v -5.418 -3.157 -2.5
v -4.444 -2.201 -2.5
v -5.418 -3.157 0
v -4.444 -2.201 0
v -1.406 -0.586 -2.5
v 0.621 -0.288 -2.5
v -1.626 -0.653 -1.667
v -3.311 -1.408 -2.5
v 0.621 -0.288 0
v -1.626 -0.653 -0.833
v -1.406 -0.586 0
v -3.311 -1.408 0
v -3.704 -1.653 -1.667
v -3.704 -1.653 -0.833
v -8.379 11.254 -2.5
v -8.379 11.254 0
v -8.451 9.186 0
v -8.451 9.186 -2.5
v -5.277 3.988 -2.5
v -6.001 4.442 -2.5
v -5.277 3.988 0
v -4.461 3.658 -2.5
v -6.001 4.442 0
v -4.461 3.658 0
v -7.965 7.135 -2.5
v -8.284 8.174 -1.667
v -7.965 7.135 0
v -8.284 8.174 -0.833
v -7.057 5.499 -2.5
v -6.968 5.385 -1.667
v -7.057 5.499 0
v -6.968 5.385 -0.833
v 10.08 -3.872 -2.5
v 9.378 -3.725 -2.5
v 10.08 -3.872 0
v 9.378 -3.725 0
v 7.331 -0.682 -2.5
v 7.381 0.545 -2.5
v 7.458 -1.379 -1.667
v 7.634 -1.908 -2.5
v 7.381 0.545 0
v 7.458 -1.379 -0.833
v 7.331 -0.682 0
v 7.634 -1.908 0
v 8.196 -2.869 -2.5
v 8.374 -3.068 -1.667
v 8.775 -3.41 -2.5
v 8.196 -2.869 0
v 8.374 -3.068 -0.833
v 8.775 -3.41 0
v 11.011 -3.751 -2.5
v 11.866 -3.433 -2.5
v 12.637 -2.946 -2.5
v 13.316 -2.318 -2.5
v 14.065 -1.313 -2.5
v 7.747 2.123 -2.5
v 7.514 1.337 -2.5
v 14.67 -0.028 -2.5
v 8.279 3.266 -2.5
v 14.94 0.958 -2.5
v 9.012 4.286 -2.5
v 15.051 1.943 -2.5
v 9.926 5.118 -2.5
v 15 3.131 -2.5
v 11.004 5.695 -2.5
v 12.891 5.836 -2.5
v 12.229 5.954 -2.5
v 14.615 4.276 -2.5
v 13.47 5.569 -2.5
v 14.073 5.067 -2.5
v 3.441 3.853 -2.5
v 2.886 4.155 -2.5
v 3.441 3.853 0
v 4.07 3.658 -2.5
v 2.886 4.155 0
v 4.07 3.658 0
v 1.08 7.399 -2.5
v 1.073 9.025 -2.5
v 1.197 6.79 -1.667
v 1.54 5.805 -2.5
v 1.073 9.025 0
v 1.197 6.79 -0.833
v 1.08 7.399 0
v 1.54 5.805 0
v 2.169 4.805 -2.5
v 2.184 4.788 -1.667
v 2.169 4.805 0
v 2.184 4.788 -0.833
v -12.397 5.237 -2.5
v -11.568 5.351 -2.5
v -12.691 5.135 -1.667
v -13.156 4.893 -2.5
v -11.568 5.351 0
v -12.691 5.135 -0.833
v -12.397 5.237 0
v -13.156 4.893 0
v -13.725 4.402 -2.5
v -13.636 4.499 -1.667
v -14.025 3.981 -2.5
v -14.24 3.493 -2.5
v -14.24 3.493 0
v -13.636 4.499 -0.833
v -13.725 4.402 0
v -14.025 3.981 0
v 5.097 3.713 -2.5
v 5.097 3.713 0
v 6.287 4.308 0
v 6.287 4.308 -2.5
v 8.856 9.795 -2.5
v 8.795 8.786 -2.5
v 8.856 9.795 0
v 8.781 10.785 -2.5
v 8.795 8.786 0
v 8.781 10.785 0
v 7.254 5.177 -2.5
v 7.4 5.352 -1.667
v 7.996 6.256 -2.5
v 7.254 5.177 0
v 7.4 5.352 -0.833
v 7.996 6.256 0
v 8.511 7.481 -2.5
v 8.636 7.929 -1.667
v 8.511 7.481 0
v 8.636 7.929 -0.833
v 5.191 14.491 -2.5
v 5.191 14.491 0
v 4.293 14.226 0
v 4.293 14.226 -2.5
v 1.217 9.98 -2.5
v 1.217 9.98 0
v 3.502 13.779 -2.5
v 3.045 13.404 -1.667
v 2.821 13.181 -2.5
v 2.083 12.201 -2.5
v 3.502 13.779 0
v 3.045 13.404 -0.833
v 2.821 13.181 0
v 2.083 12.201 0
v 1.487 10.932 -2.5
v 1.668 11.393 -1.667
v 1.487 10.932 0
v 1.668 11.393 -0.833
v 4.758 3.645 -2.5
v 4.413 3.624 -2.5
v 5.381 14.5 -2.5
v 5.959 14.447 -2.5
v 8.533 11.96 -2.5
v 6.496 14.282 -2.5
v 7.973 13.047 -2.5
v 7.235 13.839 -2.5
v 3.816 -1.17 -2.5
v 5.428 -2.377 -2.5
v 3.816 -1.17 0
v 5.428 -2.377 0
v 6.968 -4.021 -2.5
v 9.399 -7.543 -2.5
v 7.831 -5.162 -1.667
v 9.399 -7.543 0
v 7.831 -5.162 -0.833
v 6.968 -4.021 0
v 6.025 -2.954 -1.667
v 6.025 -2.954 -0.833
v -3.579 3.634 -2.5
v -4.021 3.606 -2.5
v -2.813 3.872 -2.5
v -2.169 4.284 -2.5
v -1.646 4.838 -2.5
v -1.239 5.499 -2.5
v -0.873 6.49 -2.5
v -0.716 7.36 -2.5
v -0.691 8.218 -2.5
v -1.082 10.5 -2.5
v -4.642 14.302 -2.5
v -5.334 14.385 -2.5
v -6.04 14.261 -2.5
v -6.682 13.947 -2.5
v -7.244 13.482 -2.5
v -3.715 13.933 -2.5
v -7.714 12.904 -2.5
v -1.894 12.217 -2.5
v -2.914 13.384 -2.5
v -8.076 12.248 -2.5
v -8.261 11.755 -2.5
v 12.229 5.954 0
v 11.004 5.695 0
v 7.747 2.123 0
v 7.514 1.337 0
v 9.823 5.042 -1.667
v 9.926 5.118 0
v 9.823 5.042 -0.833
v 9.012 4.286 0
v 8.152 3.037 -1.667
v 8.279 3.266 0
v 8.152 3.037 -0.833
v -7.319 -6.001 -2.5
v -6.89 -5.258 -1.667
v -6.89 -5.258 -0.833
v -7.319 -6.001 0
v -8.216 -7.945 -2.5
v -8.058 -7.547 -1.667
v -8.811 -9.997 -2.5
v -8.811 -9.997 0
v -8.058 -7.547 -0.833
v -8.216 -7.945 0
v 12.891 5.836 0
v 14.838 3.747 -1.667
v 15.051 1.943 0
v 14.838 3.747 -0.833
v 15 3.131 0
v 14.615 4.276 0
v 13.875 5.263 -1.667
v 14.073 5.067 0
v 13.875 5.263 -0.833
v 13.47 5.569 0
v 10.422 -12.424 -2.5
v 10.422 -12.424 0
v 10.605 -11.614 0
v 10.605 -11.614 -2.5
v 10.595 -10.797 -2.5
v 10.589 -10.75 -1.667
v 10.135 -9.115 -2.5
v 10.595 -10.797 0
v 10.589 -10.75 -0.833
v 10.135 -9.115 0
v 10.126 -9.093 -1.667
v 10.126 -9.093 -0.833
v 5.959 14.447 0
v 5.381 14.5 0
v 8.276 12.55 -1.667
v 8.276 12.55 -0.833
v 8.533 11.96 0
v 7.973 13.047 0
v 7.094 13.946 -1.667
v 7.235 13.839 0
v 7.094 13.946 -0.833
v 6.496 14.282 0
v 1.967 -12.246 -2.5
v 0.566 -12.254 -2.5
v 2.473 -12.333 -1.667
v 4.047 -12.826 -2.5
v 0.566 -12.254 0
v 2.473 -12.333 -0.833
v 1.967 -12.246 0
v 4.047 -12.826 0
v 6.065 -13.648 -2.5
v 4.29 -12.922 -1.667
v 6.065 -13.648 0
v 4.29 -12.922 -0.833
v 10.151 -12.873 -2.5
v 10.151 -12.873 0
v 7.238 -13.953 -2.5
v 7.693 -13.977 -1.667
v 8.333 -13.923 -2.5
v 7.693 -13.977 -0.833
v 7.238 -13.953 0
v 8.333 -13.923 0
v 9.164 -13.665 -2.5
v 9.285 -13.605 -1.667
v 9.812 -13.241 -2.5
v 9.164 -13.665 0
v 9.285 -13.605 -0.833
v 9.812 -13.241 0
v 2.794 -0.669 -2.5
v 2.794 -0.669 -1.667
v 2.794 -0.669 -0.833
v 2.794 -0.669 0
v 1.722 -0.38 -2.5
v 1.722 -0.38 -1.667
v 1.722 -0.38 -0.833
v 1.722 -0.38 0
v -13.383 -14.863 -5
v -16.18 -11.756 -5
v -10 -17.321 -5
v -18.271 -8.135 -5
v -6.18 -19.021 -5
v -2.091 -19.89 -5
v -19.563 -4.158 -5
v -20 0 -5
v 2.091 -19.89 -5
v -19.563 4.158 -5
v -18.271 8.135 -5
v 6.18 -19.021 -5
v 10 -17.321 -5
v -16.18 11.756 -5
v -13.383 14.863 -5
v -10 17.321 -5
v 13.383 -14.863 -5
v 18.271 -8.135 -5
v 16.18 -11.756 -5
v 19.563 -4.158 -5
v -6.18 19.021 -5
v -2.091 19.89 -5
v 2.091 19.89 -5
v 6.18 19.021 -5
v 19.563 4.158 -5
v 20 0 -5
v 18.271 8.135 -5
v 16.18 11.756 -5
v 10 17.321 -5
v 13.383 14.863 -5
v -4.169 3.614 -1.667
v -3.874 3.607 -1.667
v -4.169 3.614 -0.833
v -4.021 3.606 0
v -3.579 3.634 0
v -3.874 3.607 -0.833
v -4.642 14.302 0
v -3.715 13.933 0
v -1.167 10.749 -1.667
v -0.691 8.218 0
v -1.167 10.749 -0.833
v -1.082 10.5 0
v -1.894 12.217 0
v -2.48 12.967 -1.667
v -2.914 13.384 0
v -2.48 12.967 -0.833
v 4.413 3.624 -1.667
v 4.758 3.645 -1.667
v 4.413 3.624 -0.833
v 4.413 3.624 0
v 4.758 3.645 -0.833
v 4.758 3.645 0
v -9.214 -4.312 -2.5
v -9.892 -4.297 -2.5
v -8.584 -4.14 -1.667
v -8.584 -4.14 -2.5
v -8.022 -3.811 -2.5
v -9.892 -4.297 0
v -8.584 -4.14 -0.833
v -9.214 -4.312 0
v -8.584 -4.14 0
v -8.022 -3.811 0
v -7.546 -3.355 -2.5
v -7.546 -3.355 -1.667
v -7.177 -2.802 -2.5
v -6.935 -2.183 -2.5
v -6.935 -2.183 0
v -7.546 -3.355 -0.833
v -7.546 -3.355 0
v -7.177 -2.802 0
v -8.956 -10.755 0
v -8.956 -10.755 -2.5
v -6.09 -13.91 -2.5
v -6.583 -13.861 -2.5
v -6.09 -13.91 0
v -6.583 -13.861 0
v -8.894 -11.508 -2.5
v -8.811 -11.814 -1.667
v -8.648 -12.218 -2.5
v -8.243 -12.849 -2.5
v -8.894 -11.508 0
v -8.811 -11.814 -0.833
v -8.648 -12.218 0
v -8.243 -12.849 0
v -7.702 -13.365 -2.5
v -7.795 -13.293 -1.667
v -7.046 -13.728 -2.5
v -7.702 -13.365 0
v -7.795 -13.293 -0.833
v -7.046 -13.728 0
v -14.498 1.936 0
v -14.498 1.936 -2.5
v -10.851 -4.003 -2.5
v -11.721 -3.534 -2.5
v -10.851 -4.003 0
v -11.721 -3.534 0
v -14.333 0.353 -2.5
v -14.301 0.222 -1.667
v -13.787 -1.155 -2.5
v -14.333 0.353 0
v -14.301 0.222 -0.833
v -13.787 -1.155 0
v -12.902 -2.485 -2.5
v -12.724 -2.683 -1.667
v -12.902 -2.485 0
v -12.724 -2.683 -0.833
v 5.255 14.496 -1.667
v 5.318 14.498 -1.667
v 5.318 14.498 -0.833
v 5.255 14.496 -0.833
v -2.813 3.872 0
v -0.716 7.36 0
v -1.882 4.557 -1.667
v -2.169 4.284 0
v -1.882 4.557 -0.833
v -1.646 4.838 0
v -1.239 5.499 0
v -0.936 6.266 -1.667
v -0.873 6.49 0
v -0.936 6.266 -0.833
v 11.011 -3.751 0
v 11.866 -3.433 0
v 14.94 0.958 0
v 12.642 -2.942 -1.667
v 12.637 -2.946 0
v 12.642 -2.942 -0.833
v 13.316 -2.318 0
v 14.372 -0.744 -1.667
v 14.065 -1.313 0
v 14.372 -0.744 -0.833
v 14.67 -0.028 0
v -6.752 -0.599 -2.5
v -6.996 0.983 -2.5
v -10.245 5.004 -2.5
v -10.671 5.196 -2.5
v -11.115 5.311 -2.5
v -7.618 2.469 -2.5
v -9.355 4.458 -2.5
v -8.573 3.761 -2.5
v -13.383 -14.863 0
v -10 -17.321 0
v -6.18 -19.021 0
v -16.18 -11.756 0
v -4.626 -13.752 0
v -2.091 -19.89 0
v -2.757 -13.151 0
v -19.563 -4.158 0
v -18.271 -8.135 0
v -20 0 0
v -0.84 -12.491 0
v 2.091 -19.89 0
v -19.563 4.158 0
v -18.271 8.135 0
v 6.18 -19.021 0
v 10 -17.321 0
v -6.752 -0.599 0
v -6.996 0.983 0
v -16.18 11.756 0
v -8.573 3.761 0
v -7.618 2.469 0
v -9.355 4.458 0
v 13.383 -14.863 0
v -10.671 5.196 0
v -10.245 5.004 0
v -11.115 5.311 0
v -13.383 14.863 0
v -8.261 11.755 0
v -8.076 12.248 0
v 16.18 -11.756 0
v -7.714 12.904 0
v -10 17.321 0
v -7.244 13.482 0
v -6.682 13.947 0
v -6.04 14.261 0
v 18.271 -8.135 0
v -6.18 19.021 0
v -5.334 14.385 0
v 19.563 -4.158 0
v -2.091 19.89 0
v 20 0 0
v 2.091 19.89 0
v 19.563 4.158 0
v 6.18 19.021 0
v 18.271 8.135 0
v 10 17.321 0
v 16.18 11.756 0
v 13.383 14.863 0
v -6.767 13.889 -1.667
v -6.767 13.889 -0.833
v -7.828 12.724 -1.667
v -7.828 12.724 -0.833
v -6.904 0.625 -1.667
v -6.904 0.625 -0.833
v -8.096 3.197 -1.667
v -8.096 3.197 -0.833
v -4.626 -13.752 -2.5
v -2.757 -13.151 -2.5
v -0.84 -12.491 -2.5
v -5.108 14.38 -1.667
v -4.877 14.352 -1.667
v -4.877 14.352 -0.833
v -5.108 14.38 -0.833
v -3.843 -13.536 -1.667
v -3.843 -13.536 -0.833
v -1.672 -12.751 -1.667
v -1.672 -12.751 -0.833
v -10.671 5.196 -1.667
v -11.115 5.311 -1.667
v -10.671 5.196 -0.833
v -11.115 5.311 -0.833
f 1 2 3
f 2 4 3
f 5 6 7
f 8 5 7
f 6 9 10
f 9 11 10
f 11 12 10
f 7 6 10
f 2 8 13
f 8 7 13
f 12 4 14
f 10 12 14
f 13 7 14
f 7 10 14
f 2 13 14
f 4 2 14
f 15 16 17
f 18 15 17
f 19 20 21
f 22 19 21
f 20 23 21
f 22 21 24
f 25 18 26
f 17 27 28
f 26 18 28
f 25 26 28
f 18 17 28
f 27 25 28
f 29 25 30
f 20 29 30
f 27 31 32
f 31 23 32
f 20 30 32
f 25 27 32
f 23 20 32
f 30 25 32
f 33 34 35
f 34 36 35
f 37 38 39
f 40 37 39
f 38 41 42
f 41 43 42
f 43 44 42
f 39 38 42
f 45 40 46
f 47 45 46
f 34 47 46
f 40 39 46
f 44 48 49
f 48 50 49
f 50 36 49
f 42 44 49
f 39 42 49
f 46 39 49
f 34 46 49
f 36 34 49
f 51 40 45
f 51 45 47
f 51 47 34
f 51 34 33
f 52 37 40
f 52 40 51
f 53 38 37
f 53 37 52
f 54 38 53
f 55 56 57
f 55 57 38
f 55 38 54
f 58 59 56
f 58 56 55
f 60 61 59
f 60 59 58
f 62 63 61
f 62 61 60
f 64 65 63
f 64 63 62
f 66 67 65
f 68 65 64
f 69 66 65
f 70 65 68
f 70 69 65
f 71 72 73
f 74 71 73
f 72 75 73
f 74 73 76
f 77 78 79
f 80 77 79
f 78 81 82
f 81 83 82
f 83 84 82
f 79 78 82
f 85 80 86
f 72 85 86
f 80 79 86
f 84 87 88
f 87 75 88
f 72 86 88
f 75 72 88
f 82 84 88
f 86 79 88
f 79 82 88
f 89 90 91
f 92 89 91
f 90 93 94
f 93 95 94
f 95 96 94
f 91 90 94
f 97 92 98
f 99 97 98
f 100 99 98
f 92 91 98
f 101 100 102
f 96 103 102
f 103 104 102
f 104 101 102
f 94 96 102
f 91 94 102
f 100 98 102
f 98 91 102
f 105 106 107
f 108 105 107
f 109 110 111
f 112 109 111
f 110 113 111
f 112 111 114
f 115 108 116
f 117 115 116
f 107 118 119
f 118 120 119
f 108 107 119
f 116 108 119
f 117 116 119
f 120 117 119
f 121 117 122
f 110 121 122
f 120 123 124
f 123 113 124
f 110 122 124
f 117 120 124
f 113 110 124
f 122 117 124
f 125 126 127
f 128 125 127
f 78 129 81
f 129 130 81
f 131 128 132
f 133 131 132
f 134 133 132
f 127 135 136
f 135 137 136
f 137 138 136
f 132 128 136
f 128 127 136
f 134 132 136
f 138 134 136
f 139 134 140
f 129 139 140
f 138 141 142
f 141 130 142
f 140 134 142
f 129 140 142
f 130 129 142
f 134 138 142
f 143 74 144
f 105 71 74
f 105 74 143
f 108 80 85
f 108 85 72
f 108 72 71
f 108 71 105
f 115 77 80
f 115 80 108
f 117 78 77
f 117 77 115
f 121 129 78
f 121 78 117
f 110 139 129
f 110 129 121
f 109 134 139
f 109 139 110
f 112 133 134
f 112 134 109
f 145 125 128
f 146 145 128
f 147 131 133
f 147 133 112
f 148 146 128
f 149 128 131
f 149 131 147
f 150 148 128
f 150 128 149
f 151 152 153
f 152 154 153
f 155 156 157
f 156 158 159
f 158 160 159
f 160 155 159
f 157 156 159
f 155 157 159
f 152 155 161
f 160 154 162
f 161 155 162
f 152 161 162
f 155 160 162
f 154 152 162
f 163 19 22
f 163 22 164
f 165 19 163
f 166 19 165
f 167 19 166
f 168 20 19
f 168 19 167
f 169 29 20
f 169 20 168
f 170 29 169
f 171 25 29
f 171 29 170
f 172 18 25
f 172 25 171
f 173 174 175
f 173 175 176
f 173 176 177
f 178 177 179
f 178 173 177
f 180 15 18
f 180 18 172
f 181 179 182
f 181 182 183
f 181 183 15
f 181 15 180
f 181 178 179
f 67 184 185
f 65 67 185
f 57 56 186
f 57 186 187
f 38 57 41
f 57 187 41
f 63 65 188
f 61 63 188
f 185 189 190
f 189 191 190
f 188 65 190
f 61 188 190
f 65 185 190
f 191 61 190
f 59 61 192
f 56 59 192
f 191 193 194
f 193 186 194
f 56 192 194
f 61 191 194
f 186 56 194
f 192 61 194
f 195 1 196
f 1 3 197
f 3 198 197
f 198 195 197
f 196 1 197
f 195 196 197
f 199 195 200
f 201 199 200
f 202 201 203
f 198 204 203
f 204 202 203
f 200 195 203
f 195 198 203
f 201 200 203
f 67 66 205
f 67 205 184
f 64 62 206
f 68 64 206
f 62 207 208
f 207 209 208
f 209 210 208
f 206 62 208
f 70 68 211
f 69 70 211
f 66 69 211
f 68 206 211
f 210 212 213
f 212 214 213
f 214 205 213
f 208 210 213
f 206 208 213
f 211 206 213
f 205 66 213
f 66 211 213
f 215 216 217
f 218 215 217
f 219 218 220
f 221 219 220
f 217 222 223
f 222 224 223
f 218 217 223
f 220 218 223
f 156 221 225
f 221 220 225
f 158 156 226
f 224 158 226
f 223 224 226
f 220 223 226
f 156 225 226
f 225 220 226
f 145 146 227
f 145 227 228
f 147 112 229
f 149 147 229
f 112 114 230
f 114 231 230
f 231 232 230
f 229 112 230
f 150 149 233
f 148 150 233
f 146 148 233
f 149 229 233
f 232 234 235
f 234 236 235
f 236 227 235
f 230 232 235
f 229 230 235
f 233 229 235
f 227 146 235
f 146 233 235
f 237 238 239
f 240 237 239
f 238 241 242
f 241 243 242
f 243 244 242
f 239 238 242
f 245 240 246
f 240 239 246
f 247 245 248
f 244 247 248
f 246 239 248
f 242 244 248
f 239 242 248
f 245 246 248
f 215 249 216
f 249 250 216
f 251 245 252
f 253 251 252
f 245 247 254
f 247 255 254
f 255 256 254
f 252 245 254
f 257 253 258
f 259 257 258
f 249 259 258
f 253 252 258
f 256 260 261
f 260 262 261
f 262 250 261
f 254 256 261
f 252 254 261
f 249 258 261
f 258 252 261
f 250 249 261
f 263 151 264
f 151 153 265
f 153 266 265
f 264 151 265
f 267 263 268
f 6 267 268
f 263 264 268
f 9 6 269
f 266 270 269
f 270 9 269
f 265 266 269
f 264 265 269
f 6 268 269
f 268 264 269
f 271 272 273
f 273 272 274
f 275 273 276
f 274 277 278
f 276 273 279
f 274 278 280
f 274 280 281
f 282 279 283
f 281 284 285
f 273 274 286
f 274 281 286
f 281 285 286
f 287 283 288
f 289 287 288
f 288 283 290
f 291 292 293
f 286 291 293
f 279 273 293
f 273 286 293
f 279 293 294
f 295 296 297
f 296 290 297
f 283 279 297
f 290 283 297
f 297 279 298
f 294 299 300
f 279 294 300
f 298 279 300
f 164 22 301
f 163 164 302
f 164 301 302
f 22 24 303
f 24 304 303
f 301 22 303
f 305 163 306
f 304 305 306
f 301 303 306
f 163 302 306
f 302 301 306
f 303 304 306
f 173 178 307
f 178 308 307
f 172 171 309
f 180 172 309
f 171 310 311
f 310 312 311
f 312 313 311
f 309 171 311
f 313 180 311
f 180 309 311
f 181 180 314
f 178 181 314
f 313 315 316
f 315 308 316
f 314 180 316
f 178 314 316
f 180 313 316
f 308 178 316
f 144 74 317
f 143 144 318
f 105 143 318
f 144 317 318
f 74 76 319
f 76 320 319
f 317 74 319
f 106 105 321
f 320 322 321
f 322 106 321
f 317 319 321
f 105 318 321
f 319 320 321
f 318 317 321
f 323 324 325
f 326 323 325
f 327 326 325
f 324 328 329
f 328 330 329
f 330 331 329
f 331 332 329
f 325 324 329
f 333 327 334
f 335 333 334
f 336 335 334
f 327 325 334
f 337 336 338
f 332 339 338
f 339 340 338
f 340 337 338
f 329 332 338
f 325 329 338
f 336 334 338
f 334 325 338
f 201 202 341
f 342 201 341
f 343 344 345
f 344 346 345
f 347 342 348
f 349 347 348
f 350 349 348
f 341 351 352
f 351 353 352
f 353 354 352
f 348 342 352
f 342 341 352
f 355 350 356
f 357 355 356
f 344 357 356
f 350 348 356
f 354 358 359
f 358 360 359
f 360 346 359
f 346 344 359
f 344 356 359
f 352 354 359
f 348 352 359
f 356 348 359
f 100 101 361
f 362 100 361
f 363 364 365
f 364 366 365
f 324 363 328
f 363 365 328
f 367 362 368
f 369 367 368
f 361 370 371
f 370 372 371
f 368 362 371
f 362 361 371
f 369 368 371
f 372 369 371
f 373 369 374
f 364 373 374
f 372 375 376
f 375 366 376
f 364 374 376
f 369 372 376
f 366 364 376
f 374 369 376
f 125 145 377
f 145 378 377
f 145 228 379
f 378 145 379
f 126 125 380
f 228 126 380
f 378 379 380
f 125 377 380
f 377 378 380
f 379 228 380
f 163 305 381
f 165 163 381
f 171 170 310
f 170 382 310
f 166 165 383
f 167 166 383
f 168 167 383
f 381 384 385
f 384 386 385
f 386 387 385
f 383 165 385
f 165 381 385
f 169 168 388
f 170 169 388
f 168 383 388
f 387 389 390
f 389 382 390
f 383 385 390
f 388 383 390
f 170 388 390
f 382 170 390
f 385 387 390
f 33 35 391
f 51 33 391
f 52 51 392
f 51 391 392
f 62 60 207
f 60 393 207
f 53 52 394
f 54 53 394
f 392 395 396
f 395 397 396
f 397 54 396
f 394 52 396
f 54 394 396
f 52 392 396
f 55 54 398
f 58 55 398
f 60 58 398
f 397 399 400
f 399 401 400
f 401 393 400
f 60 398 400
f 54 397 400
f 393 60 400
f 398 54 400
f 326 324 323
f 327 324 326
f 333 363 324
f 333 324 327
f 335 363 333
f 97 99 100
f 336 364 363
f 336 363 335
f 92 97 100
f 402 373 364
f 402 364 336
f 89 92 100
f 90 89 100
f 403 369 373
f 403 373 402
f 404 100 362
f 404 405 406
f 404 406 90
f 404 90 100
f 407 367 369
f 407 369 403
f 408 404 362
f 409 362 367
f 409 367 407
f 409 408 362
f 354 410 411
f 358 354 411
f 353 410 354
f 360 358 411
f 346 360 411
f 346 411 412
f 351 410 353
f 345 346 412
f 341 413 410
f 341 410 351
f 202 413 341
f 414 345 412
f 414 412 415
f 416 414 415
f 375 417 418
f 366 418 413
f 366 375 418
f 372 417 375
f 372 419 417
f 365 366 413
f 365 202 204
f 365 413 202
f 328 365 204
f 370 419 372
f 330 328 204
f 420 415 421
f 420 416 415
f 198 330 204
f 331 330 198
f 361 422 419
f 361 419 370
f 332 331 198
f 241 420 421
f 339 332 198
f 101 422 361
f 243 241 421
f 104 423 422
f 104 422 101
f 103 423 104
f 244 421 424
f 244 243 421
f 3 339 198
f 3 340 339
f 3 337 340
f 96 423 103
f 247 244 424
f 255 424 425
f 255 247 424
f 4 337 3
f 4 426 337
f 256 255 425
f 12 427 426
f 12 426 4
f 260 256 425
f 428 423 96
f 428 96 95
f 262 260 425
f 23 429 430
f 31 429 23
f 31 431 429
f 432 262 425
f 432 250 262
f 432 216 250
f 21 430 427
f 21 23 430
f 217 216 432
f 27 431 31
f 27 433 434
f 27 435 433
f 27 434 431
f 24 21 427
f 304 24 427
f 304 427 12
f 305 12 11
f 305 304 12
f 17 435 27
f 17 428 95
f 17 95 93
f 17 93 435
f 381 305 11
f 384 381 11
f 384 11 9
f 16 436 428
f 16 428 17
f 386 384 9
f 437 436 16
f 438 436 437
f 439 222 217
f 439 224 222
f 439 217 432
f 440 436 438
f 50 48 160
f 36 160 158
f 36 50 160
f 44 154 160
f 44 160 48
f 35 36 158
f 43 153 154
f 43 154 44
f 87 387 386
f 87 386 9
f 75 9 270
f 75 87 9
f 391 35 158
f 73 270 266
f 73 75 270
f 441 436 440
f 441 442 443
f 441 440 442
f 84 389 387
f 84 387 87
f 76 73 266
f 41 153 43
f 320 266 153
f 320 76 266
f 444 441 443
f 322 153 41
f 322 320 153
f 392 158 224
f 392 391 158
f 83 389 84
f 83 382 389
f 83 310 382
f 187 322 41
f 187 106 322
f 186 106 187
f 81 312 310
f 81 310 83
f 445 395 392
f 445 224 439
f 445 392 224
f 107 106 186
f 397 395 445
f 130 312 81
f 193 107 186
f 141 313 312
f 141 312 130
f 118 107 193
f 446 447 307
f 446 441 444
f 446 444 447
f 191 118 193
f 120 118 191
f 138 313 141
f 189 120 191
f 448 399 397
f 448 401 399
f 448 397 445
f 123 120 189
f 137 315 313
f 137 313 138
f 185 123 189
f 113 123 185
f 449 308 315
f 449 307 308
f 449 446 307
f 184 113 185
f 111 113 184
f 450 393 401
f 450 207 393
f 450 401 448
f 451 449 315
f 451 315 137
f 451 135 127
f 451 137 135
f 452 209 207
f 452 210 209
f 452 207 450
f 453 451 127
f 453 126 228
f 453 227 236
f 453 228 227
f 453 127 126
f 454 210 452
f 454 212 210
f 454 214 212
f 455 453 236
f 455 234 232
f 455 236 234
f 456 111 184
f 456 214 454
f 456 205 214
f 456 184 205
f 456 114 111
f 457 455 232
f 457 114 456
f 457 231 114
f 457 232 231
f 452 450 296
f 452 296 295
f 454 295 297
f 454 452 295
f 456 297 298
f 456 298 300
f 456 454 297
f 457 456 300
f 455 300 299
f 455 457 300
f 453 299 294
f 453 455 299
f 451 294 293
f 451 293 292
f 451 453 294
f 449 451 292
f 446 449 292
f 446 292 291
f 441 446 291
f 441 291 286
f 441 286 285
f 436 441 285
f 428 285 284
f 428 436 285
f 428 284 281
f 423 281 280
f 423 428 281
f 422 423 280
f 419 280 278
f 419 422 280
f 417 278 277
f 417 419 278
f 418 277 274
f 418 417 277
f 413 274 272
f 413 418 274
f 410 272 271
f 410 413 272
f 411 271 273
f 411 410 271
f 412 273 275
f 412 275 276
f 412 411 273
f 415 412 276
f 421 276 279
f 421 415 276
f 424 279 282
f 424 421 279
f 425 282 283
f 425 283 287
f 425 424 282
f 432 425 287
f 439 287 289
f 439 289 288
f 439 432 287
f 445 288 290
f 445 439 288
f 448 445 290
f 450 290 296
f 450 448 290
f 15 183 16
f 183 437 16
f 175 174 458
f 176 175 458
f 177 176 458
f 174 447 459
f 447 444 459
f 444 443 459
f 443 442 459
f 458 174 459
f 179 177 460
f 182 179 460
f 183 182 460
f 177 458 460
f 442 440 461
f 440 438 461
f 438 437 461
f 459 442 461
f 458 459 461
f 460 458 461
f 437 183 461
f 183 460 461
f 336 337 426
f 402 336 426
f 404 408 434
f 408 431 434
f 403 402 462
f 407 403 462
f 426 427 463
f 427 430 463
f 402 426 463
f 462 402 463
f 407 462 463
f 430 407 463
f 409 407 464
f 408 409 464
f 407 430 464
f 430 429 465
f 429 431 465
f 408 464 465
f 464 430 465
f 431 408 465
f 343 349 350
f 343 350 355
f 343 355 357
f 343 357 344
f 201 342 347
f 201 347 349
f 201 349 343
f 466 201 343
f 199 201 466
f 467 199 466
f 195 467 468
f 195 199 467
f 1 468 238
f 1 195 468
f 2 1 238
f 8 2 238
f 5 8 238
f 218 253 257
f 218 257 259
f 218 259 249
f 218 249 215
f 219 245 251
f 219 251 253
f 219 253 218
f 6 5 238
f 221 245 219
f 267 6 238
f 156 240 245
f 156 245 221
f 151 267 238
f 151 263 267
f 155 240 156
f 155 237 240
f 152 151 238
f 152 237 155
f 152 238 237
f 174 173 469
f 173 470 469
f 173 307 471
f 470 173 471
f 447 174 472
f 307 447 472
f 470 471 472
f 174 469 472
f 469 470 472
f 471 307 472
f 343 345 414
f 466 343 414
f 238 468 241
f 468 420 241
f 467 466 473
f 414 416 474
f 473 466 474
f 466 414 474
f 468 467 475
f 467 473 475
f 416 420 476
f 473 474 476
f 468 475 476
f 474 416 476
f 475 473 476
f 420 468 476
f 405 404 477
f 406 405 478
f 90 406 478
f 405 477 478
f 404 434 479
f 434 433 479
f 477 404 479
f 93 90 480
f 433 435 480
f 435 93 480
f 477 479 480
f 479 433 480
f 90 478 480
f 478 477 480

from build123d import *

# Parameters (mm, degrees)
SKETCH001_R  = 20
PAD_DEPTH    = 5
POCKET_DEPTH = 2.5


with BuildPart() as part:
    # Sketch001 (on DatumPlane) → Pad (new body)
    with BuildSketch(Plane.XY):
        Circle(SKETCH001_R)
    extrude(amount=-PAD_DEPTH)

    # Sketch (on DatumPlane) → Pocket (cut)
    with BuildSketch(Plane(origin=(-14.5, 14.5, 0), x_dir=(1, 0, 0), z_dir=(0, 0, 1))):
        with BuildLine():
            add(Edge.make_bspline(
                [(19.881144, 0), (19.819056, -0.000794), (19.75485, -0.003847), (19.69135, -0.008819)],
                knots=[0, 0, 0, 0, 1, 1, 1, 1], degree=3))
            add(Edge.make_bspline(
                [(19.69135, -0.008819), (17.16405, -0.4451), (15.774106, -3.117779), (15.573022, -5.474688)],
                knots=[0, 0, 0, 0, 1, 1, 1, 1], degree=3))
            add(Edge.make_bspline(
                [(15.573022, -5.474688), (15.278806, -7.61365), (16.221428, -10.361789), (18.569517, -10.841567)],
                knots=[0, 0, 0, 0, 1, 1, 1, 1], degree=3))
            add(Edge.make_bspline(
                [(18.569517, -10.841567), (18.9103, -10.906478), (19.263783, -10.876844), (19.596806, -10.786533)],
                knots=[0, 0, 0, 0, 1, 1, 1, 1], degree=3))
            add(Edge.make_bspline(
                [(19.596806, -10.786533), (22.424672, -9.838267), (23.689733, -6.489136), (23.281217, -3.715456)],
                knots=[0, 0, 0, 0, 1, 1, 1, 1], degree=3))
            add(Edge.make_bspline(
                [(23.281217, -3.715456), (23.161978, -1.923627), (21.811544, 0.024624), (19.881144, 0)],
                knots=[0, 0, 0, 0, 1, 1, 1, 1], degree=3))
        make_face()
        with BuildLine():
            add(Edge.make_bspline(
                [(9.165872, -0.114653), (7.593894, -0.153233), (6.369756, -1.747167), (6.120694, -3.245556)],
                knots=[0, 0, 0, 0, 1, 1, 1, 1], degree=3))
            add(Edge.make_bspline(
                [(6.120694, -3.245556), (5.595691, -6.21411), (6.946053, -9.902472), (10.038644, -10.841567)],
                knots=[0, 0, 0, 0, 1, 1, 1, 1], degree=3))
            add(Edge.make_bspline(
                [(10.038644, -10.841567), (10.328628, -10.904361), (10.627783, -10.910711), (10.920589, -10.865556)],
                knots=[0, 0, 0, 0, 1, 1, 1, 1], degree=3))
            add(Edge.make_bspline(
                [(10.920589, -10.865556), (13.01115, -10.517011), (13.896622, -8.173861), (13.809133, -6.281632)],
                knots=[0, 0, 0, 0, 1, 1, 1, 1], degree=3))
            add(Edge.make_bspline(
                [(13.809133, -6.281632), (13.746339, -3.785941), (12.449528, -0.900148), (9.858022, -0.198473)],
                knots=[0, 0, 0, 0, 1, 1, 1, 1], degree=3))
            add(Edge.make_bspline(
                [(9.858022, -0.198473), (9.620956, -0.135615), (9.390239, -0.109142), (9.165872, -0.114653)],
                knots=[0, 0, 0, 0, 1, 1, 1, 1], degree=3))
        make_face()
        with BuildLine():
            add(Edge.make_bspline(
                [(26.729267, -8.546042), (24.010761, -8.709025), (22.146683, -11.421886), (21.880689, -13.954831)],
                knots=[0, 0, 0, 0, 1, 1, 1, 1], degree=3))
            add(Edge.make_bspline(
                [(21.880689, -13.954831), (21.521561, -15.781514), (22.495228, -18.225558), (24.580144, -18.371608)],
                knots=[0, 0, 0, 0, 1, 1, 1, 1], degree=3))
            add(Edge.make_bspline(
                [(24.580144, -18.371608), (27.486328, -18.335625), (29.469644, -15.229769), (29.551489, -12.557125)],
                knots=[0, 0, 0, 0, 1, 1, 1, 1], degree=3))
            add(Edge.make_bspline(
                [(29.551489, -12.557125), (29.735639, -10.789708), (28.694239, -8.644114), (26.729267, -8.546042)],
                knots=[0, 0, 0, 0, 1, 1, 1, 1], degree=3))
        make_face()
        with BuildLine():
            add(Edge.make_bspline(
                [(2.932289, -9.148586), (1.775601, -9.138708), (0.638034, -9.831564), (0.260068, -11.007019)],
                knots=[0, 0, 0, 0, 1, 1, 1, 1], degree=3))
            add(Edge.make_bspline(
                [(0.260068, -11.007019), (-0.748383, -14.152386), (1.276632, -18.135953), (4.607983, -18.797058)],
                knots=[0, 0, 0, 0, 1, 1, 1, 1], degree=3))
            add(Edge.make_bspline(
                [(4.607983, -18.797058), (5.998351, -19.034831), (7.219809, -17.967325), (7.564826, -16.682508)],
                knots=[0, 0, 0, 0, 1, 1, 1, 1], degree=3))
            add(Edge.make_bspline(
                [(7.564826, -16.682508), (8.295076, -13.934369), (6.794712, -10.743847), (4.255206, -9.496425)],
                knots=[0, 0, 0, 0, 1, 1, 1, 1], degree=3))
            add(Edge.make_bspline(
                [(4.255206, -9.496425), (3.841538, -9.264297), (3.384973, -9.152114), (2.932289, -9.148586)],
                knots=[0, 0, 0, 0, 1, 1, 1, 1], degree=3))
        make_face()
        with BuildLine():
            add(Edge.make_bspline(
                [(15.120761, -14.788092), (12.853106, -14.793031), (10.550172, -15.943792), (9.081911, -17.656881)],
                knots=[0, 0, 0, 0, 1, 1, 1, 1], degree=3))
            add(Edge.make_bspline(
                [(9.081911, -17.656881), (7.495822, -19.653603), (6.196753, -21.976997), (5.688542, -24.496536)],
                knots=[0, 0, 0, 0, 1, 1, 1, 1], degree=3))
            add(Edge.make_bspline(
                [(5.688542, -24.496536), (5.07111, -26.309814), (6.470509, -28.397553), (8.409517, -28.410253)],
                knots=[0, 0, 0, 0, 1, 1, 1, 1], degree=3))
            add(Edge.make_bspline(
                [(8.409517, -28.410253), (10.742083, -28.474458), (12.746567, -26.872847), (15.065728, -26.754314)],
                knots=[0, 0, 0, 0, 1, 1, 1, 1], degree=3))
            add(Edge.make_bspline(
                [(15.065728, -26.754314), (17.033522, -26.454453), (18.795294, -27.477508), (20.564828, -28.147786)],
                knots=[0, 0, 0, 0, 1, 1, 1, 1], degree=3))
            add(Edge.make_bspline(
                [(20.564828, -28.147786), (22.071189, -28.791958), (24.152578, -28.545014), (24.921633, -26.923647)],
                knots=[0, 0, 0, 0, 1, 1, 1, 1], degree=3))
            add(Edge.make_bspline(
                [(24.921633, -26.923647), (25.526294, -25.271942), (24.635883, -23.509464), (23.898578, -22.042614)],
                knots=[0, 0, 0, 0, 1, 1, 1, 1], degree=3))
            add(Edge.make_bspline(
                [(23.898578, -22.042614), (22.394333, -19.660658), (20.782139, -17.157347), (18.315517, -15.670036)],
                knots=[0, 0, 0, 0, 1, 1, 1, 1], degree=3))
            add(Edge.make_bspline(
                [(18.315517, -15.670036), (17.327033, -15.057614), (16.228483, -14.785975), (15.120761, -14.788092)],
                knots=[0, 0, 0, 0, 1, 1, 1, 1], degree=3))
        make_face()
    extrude(amount=-POCKET_DEPTH, mode=Mode.SUBTRACT)


solid = part.part
